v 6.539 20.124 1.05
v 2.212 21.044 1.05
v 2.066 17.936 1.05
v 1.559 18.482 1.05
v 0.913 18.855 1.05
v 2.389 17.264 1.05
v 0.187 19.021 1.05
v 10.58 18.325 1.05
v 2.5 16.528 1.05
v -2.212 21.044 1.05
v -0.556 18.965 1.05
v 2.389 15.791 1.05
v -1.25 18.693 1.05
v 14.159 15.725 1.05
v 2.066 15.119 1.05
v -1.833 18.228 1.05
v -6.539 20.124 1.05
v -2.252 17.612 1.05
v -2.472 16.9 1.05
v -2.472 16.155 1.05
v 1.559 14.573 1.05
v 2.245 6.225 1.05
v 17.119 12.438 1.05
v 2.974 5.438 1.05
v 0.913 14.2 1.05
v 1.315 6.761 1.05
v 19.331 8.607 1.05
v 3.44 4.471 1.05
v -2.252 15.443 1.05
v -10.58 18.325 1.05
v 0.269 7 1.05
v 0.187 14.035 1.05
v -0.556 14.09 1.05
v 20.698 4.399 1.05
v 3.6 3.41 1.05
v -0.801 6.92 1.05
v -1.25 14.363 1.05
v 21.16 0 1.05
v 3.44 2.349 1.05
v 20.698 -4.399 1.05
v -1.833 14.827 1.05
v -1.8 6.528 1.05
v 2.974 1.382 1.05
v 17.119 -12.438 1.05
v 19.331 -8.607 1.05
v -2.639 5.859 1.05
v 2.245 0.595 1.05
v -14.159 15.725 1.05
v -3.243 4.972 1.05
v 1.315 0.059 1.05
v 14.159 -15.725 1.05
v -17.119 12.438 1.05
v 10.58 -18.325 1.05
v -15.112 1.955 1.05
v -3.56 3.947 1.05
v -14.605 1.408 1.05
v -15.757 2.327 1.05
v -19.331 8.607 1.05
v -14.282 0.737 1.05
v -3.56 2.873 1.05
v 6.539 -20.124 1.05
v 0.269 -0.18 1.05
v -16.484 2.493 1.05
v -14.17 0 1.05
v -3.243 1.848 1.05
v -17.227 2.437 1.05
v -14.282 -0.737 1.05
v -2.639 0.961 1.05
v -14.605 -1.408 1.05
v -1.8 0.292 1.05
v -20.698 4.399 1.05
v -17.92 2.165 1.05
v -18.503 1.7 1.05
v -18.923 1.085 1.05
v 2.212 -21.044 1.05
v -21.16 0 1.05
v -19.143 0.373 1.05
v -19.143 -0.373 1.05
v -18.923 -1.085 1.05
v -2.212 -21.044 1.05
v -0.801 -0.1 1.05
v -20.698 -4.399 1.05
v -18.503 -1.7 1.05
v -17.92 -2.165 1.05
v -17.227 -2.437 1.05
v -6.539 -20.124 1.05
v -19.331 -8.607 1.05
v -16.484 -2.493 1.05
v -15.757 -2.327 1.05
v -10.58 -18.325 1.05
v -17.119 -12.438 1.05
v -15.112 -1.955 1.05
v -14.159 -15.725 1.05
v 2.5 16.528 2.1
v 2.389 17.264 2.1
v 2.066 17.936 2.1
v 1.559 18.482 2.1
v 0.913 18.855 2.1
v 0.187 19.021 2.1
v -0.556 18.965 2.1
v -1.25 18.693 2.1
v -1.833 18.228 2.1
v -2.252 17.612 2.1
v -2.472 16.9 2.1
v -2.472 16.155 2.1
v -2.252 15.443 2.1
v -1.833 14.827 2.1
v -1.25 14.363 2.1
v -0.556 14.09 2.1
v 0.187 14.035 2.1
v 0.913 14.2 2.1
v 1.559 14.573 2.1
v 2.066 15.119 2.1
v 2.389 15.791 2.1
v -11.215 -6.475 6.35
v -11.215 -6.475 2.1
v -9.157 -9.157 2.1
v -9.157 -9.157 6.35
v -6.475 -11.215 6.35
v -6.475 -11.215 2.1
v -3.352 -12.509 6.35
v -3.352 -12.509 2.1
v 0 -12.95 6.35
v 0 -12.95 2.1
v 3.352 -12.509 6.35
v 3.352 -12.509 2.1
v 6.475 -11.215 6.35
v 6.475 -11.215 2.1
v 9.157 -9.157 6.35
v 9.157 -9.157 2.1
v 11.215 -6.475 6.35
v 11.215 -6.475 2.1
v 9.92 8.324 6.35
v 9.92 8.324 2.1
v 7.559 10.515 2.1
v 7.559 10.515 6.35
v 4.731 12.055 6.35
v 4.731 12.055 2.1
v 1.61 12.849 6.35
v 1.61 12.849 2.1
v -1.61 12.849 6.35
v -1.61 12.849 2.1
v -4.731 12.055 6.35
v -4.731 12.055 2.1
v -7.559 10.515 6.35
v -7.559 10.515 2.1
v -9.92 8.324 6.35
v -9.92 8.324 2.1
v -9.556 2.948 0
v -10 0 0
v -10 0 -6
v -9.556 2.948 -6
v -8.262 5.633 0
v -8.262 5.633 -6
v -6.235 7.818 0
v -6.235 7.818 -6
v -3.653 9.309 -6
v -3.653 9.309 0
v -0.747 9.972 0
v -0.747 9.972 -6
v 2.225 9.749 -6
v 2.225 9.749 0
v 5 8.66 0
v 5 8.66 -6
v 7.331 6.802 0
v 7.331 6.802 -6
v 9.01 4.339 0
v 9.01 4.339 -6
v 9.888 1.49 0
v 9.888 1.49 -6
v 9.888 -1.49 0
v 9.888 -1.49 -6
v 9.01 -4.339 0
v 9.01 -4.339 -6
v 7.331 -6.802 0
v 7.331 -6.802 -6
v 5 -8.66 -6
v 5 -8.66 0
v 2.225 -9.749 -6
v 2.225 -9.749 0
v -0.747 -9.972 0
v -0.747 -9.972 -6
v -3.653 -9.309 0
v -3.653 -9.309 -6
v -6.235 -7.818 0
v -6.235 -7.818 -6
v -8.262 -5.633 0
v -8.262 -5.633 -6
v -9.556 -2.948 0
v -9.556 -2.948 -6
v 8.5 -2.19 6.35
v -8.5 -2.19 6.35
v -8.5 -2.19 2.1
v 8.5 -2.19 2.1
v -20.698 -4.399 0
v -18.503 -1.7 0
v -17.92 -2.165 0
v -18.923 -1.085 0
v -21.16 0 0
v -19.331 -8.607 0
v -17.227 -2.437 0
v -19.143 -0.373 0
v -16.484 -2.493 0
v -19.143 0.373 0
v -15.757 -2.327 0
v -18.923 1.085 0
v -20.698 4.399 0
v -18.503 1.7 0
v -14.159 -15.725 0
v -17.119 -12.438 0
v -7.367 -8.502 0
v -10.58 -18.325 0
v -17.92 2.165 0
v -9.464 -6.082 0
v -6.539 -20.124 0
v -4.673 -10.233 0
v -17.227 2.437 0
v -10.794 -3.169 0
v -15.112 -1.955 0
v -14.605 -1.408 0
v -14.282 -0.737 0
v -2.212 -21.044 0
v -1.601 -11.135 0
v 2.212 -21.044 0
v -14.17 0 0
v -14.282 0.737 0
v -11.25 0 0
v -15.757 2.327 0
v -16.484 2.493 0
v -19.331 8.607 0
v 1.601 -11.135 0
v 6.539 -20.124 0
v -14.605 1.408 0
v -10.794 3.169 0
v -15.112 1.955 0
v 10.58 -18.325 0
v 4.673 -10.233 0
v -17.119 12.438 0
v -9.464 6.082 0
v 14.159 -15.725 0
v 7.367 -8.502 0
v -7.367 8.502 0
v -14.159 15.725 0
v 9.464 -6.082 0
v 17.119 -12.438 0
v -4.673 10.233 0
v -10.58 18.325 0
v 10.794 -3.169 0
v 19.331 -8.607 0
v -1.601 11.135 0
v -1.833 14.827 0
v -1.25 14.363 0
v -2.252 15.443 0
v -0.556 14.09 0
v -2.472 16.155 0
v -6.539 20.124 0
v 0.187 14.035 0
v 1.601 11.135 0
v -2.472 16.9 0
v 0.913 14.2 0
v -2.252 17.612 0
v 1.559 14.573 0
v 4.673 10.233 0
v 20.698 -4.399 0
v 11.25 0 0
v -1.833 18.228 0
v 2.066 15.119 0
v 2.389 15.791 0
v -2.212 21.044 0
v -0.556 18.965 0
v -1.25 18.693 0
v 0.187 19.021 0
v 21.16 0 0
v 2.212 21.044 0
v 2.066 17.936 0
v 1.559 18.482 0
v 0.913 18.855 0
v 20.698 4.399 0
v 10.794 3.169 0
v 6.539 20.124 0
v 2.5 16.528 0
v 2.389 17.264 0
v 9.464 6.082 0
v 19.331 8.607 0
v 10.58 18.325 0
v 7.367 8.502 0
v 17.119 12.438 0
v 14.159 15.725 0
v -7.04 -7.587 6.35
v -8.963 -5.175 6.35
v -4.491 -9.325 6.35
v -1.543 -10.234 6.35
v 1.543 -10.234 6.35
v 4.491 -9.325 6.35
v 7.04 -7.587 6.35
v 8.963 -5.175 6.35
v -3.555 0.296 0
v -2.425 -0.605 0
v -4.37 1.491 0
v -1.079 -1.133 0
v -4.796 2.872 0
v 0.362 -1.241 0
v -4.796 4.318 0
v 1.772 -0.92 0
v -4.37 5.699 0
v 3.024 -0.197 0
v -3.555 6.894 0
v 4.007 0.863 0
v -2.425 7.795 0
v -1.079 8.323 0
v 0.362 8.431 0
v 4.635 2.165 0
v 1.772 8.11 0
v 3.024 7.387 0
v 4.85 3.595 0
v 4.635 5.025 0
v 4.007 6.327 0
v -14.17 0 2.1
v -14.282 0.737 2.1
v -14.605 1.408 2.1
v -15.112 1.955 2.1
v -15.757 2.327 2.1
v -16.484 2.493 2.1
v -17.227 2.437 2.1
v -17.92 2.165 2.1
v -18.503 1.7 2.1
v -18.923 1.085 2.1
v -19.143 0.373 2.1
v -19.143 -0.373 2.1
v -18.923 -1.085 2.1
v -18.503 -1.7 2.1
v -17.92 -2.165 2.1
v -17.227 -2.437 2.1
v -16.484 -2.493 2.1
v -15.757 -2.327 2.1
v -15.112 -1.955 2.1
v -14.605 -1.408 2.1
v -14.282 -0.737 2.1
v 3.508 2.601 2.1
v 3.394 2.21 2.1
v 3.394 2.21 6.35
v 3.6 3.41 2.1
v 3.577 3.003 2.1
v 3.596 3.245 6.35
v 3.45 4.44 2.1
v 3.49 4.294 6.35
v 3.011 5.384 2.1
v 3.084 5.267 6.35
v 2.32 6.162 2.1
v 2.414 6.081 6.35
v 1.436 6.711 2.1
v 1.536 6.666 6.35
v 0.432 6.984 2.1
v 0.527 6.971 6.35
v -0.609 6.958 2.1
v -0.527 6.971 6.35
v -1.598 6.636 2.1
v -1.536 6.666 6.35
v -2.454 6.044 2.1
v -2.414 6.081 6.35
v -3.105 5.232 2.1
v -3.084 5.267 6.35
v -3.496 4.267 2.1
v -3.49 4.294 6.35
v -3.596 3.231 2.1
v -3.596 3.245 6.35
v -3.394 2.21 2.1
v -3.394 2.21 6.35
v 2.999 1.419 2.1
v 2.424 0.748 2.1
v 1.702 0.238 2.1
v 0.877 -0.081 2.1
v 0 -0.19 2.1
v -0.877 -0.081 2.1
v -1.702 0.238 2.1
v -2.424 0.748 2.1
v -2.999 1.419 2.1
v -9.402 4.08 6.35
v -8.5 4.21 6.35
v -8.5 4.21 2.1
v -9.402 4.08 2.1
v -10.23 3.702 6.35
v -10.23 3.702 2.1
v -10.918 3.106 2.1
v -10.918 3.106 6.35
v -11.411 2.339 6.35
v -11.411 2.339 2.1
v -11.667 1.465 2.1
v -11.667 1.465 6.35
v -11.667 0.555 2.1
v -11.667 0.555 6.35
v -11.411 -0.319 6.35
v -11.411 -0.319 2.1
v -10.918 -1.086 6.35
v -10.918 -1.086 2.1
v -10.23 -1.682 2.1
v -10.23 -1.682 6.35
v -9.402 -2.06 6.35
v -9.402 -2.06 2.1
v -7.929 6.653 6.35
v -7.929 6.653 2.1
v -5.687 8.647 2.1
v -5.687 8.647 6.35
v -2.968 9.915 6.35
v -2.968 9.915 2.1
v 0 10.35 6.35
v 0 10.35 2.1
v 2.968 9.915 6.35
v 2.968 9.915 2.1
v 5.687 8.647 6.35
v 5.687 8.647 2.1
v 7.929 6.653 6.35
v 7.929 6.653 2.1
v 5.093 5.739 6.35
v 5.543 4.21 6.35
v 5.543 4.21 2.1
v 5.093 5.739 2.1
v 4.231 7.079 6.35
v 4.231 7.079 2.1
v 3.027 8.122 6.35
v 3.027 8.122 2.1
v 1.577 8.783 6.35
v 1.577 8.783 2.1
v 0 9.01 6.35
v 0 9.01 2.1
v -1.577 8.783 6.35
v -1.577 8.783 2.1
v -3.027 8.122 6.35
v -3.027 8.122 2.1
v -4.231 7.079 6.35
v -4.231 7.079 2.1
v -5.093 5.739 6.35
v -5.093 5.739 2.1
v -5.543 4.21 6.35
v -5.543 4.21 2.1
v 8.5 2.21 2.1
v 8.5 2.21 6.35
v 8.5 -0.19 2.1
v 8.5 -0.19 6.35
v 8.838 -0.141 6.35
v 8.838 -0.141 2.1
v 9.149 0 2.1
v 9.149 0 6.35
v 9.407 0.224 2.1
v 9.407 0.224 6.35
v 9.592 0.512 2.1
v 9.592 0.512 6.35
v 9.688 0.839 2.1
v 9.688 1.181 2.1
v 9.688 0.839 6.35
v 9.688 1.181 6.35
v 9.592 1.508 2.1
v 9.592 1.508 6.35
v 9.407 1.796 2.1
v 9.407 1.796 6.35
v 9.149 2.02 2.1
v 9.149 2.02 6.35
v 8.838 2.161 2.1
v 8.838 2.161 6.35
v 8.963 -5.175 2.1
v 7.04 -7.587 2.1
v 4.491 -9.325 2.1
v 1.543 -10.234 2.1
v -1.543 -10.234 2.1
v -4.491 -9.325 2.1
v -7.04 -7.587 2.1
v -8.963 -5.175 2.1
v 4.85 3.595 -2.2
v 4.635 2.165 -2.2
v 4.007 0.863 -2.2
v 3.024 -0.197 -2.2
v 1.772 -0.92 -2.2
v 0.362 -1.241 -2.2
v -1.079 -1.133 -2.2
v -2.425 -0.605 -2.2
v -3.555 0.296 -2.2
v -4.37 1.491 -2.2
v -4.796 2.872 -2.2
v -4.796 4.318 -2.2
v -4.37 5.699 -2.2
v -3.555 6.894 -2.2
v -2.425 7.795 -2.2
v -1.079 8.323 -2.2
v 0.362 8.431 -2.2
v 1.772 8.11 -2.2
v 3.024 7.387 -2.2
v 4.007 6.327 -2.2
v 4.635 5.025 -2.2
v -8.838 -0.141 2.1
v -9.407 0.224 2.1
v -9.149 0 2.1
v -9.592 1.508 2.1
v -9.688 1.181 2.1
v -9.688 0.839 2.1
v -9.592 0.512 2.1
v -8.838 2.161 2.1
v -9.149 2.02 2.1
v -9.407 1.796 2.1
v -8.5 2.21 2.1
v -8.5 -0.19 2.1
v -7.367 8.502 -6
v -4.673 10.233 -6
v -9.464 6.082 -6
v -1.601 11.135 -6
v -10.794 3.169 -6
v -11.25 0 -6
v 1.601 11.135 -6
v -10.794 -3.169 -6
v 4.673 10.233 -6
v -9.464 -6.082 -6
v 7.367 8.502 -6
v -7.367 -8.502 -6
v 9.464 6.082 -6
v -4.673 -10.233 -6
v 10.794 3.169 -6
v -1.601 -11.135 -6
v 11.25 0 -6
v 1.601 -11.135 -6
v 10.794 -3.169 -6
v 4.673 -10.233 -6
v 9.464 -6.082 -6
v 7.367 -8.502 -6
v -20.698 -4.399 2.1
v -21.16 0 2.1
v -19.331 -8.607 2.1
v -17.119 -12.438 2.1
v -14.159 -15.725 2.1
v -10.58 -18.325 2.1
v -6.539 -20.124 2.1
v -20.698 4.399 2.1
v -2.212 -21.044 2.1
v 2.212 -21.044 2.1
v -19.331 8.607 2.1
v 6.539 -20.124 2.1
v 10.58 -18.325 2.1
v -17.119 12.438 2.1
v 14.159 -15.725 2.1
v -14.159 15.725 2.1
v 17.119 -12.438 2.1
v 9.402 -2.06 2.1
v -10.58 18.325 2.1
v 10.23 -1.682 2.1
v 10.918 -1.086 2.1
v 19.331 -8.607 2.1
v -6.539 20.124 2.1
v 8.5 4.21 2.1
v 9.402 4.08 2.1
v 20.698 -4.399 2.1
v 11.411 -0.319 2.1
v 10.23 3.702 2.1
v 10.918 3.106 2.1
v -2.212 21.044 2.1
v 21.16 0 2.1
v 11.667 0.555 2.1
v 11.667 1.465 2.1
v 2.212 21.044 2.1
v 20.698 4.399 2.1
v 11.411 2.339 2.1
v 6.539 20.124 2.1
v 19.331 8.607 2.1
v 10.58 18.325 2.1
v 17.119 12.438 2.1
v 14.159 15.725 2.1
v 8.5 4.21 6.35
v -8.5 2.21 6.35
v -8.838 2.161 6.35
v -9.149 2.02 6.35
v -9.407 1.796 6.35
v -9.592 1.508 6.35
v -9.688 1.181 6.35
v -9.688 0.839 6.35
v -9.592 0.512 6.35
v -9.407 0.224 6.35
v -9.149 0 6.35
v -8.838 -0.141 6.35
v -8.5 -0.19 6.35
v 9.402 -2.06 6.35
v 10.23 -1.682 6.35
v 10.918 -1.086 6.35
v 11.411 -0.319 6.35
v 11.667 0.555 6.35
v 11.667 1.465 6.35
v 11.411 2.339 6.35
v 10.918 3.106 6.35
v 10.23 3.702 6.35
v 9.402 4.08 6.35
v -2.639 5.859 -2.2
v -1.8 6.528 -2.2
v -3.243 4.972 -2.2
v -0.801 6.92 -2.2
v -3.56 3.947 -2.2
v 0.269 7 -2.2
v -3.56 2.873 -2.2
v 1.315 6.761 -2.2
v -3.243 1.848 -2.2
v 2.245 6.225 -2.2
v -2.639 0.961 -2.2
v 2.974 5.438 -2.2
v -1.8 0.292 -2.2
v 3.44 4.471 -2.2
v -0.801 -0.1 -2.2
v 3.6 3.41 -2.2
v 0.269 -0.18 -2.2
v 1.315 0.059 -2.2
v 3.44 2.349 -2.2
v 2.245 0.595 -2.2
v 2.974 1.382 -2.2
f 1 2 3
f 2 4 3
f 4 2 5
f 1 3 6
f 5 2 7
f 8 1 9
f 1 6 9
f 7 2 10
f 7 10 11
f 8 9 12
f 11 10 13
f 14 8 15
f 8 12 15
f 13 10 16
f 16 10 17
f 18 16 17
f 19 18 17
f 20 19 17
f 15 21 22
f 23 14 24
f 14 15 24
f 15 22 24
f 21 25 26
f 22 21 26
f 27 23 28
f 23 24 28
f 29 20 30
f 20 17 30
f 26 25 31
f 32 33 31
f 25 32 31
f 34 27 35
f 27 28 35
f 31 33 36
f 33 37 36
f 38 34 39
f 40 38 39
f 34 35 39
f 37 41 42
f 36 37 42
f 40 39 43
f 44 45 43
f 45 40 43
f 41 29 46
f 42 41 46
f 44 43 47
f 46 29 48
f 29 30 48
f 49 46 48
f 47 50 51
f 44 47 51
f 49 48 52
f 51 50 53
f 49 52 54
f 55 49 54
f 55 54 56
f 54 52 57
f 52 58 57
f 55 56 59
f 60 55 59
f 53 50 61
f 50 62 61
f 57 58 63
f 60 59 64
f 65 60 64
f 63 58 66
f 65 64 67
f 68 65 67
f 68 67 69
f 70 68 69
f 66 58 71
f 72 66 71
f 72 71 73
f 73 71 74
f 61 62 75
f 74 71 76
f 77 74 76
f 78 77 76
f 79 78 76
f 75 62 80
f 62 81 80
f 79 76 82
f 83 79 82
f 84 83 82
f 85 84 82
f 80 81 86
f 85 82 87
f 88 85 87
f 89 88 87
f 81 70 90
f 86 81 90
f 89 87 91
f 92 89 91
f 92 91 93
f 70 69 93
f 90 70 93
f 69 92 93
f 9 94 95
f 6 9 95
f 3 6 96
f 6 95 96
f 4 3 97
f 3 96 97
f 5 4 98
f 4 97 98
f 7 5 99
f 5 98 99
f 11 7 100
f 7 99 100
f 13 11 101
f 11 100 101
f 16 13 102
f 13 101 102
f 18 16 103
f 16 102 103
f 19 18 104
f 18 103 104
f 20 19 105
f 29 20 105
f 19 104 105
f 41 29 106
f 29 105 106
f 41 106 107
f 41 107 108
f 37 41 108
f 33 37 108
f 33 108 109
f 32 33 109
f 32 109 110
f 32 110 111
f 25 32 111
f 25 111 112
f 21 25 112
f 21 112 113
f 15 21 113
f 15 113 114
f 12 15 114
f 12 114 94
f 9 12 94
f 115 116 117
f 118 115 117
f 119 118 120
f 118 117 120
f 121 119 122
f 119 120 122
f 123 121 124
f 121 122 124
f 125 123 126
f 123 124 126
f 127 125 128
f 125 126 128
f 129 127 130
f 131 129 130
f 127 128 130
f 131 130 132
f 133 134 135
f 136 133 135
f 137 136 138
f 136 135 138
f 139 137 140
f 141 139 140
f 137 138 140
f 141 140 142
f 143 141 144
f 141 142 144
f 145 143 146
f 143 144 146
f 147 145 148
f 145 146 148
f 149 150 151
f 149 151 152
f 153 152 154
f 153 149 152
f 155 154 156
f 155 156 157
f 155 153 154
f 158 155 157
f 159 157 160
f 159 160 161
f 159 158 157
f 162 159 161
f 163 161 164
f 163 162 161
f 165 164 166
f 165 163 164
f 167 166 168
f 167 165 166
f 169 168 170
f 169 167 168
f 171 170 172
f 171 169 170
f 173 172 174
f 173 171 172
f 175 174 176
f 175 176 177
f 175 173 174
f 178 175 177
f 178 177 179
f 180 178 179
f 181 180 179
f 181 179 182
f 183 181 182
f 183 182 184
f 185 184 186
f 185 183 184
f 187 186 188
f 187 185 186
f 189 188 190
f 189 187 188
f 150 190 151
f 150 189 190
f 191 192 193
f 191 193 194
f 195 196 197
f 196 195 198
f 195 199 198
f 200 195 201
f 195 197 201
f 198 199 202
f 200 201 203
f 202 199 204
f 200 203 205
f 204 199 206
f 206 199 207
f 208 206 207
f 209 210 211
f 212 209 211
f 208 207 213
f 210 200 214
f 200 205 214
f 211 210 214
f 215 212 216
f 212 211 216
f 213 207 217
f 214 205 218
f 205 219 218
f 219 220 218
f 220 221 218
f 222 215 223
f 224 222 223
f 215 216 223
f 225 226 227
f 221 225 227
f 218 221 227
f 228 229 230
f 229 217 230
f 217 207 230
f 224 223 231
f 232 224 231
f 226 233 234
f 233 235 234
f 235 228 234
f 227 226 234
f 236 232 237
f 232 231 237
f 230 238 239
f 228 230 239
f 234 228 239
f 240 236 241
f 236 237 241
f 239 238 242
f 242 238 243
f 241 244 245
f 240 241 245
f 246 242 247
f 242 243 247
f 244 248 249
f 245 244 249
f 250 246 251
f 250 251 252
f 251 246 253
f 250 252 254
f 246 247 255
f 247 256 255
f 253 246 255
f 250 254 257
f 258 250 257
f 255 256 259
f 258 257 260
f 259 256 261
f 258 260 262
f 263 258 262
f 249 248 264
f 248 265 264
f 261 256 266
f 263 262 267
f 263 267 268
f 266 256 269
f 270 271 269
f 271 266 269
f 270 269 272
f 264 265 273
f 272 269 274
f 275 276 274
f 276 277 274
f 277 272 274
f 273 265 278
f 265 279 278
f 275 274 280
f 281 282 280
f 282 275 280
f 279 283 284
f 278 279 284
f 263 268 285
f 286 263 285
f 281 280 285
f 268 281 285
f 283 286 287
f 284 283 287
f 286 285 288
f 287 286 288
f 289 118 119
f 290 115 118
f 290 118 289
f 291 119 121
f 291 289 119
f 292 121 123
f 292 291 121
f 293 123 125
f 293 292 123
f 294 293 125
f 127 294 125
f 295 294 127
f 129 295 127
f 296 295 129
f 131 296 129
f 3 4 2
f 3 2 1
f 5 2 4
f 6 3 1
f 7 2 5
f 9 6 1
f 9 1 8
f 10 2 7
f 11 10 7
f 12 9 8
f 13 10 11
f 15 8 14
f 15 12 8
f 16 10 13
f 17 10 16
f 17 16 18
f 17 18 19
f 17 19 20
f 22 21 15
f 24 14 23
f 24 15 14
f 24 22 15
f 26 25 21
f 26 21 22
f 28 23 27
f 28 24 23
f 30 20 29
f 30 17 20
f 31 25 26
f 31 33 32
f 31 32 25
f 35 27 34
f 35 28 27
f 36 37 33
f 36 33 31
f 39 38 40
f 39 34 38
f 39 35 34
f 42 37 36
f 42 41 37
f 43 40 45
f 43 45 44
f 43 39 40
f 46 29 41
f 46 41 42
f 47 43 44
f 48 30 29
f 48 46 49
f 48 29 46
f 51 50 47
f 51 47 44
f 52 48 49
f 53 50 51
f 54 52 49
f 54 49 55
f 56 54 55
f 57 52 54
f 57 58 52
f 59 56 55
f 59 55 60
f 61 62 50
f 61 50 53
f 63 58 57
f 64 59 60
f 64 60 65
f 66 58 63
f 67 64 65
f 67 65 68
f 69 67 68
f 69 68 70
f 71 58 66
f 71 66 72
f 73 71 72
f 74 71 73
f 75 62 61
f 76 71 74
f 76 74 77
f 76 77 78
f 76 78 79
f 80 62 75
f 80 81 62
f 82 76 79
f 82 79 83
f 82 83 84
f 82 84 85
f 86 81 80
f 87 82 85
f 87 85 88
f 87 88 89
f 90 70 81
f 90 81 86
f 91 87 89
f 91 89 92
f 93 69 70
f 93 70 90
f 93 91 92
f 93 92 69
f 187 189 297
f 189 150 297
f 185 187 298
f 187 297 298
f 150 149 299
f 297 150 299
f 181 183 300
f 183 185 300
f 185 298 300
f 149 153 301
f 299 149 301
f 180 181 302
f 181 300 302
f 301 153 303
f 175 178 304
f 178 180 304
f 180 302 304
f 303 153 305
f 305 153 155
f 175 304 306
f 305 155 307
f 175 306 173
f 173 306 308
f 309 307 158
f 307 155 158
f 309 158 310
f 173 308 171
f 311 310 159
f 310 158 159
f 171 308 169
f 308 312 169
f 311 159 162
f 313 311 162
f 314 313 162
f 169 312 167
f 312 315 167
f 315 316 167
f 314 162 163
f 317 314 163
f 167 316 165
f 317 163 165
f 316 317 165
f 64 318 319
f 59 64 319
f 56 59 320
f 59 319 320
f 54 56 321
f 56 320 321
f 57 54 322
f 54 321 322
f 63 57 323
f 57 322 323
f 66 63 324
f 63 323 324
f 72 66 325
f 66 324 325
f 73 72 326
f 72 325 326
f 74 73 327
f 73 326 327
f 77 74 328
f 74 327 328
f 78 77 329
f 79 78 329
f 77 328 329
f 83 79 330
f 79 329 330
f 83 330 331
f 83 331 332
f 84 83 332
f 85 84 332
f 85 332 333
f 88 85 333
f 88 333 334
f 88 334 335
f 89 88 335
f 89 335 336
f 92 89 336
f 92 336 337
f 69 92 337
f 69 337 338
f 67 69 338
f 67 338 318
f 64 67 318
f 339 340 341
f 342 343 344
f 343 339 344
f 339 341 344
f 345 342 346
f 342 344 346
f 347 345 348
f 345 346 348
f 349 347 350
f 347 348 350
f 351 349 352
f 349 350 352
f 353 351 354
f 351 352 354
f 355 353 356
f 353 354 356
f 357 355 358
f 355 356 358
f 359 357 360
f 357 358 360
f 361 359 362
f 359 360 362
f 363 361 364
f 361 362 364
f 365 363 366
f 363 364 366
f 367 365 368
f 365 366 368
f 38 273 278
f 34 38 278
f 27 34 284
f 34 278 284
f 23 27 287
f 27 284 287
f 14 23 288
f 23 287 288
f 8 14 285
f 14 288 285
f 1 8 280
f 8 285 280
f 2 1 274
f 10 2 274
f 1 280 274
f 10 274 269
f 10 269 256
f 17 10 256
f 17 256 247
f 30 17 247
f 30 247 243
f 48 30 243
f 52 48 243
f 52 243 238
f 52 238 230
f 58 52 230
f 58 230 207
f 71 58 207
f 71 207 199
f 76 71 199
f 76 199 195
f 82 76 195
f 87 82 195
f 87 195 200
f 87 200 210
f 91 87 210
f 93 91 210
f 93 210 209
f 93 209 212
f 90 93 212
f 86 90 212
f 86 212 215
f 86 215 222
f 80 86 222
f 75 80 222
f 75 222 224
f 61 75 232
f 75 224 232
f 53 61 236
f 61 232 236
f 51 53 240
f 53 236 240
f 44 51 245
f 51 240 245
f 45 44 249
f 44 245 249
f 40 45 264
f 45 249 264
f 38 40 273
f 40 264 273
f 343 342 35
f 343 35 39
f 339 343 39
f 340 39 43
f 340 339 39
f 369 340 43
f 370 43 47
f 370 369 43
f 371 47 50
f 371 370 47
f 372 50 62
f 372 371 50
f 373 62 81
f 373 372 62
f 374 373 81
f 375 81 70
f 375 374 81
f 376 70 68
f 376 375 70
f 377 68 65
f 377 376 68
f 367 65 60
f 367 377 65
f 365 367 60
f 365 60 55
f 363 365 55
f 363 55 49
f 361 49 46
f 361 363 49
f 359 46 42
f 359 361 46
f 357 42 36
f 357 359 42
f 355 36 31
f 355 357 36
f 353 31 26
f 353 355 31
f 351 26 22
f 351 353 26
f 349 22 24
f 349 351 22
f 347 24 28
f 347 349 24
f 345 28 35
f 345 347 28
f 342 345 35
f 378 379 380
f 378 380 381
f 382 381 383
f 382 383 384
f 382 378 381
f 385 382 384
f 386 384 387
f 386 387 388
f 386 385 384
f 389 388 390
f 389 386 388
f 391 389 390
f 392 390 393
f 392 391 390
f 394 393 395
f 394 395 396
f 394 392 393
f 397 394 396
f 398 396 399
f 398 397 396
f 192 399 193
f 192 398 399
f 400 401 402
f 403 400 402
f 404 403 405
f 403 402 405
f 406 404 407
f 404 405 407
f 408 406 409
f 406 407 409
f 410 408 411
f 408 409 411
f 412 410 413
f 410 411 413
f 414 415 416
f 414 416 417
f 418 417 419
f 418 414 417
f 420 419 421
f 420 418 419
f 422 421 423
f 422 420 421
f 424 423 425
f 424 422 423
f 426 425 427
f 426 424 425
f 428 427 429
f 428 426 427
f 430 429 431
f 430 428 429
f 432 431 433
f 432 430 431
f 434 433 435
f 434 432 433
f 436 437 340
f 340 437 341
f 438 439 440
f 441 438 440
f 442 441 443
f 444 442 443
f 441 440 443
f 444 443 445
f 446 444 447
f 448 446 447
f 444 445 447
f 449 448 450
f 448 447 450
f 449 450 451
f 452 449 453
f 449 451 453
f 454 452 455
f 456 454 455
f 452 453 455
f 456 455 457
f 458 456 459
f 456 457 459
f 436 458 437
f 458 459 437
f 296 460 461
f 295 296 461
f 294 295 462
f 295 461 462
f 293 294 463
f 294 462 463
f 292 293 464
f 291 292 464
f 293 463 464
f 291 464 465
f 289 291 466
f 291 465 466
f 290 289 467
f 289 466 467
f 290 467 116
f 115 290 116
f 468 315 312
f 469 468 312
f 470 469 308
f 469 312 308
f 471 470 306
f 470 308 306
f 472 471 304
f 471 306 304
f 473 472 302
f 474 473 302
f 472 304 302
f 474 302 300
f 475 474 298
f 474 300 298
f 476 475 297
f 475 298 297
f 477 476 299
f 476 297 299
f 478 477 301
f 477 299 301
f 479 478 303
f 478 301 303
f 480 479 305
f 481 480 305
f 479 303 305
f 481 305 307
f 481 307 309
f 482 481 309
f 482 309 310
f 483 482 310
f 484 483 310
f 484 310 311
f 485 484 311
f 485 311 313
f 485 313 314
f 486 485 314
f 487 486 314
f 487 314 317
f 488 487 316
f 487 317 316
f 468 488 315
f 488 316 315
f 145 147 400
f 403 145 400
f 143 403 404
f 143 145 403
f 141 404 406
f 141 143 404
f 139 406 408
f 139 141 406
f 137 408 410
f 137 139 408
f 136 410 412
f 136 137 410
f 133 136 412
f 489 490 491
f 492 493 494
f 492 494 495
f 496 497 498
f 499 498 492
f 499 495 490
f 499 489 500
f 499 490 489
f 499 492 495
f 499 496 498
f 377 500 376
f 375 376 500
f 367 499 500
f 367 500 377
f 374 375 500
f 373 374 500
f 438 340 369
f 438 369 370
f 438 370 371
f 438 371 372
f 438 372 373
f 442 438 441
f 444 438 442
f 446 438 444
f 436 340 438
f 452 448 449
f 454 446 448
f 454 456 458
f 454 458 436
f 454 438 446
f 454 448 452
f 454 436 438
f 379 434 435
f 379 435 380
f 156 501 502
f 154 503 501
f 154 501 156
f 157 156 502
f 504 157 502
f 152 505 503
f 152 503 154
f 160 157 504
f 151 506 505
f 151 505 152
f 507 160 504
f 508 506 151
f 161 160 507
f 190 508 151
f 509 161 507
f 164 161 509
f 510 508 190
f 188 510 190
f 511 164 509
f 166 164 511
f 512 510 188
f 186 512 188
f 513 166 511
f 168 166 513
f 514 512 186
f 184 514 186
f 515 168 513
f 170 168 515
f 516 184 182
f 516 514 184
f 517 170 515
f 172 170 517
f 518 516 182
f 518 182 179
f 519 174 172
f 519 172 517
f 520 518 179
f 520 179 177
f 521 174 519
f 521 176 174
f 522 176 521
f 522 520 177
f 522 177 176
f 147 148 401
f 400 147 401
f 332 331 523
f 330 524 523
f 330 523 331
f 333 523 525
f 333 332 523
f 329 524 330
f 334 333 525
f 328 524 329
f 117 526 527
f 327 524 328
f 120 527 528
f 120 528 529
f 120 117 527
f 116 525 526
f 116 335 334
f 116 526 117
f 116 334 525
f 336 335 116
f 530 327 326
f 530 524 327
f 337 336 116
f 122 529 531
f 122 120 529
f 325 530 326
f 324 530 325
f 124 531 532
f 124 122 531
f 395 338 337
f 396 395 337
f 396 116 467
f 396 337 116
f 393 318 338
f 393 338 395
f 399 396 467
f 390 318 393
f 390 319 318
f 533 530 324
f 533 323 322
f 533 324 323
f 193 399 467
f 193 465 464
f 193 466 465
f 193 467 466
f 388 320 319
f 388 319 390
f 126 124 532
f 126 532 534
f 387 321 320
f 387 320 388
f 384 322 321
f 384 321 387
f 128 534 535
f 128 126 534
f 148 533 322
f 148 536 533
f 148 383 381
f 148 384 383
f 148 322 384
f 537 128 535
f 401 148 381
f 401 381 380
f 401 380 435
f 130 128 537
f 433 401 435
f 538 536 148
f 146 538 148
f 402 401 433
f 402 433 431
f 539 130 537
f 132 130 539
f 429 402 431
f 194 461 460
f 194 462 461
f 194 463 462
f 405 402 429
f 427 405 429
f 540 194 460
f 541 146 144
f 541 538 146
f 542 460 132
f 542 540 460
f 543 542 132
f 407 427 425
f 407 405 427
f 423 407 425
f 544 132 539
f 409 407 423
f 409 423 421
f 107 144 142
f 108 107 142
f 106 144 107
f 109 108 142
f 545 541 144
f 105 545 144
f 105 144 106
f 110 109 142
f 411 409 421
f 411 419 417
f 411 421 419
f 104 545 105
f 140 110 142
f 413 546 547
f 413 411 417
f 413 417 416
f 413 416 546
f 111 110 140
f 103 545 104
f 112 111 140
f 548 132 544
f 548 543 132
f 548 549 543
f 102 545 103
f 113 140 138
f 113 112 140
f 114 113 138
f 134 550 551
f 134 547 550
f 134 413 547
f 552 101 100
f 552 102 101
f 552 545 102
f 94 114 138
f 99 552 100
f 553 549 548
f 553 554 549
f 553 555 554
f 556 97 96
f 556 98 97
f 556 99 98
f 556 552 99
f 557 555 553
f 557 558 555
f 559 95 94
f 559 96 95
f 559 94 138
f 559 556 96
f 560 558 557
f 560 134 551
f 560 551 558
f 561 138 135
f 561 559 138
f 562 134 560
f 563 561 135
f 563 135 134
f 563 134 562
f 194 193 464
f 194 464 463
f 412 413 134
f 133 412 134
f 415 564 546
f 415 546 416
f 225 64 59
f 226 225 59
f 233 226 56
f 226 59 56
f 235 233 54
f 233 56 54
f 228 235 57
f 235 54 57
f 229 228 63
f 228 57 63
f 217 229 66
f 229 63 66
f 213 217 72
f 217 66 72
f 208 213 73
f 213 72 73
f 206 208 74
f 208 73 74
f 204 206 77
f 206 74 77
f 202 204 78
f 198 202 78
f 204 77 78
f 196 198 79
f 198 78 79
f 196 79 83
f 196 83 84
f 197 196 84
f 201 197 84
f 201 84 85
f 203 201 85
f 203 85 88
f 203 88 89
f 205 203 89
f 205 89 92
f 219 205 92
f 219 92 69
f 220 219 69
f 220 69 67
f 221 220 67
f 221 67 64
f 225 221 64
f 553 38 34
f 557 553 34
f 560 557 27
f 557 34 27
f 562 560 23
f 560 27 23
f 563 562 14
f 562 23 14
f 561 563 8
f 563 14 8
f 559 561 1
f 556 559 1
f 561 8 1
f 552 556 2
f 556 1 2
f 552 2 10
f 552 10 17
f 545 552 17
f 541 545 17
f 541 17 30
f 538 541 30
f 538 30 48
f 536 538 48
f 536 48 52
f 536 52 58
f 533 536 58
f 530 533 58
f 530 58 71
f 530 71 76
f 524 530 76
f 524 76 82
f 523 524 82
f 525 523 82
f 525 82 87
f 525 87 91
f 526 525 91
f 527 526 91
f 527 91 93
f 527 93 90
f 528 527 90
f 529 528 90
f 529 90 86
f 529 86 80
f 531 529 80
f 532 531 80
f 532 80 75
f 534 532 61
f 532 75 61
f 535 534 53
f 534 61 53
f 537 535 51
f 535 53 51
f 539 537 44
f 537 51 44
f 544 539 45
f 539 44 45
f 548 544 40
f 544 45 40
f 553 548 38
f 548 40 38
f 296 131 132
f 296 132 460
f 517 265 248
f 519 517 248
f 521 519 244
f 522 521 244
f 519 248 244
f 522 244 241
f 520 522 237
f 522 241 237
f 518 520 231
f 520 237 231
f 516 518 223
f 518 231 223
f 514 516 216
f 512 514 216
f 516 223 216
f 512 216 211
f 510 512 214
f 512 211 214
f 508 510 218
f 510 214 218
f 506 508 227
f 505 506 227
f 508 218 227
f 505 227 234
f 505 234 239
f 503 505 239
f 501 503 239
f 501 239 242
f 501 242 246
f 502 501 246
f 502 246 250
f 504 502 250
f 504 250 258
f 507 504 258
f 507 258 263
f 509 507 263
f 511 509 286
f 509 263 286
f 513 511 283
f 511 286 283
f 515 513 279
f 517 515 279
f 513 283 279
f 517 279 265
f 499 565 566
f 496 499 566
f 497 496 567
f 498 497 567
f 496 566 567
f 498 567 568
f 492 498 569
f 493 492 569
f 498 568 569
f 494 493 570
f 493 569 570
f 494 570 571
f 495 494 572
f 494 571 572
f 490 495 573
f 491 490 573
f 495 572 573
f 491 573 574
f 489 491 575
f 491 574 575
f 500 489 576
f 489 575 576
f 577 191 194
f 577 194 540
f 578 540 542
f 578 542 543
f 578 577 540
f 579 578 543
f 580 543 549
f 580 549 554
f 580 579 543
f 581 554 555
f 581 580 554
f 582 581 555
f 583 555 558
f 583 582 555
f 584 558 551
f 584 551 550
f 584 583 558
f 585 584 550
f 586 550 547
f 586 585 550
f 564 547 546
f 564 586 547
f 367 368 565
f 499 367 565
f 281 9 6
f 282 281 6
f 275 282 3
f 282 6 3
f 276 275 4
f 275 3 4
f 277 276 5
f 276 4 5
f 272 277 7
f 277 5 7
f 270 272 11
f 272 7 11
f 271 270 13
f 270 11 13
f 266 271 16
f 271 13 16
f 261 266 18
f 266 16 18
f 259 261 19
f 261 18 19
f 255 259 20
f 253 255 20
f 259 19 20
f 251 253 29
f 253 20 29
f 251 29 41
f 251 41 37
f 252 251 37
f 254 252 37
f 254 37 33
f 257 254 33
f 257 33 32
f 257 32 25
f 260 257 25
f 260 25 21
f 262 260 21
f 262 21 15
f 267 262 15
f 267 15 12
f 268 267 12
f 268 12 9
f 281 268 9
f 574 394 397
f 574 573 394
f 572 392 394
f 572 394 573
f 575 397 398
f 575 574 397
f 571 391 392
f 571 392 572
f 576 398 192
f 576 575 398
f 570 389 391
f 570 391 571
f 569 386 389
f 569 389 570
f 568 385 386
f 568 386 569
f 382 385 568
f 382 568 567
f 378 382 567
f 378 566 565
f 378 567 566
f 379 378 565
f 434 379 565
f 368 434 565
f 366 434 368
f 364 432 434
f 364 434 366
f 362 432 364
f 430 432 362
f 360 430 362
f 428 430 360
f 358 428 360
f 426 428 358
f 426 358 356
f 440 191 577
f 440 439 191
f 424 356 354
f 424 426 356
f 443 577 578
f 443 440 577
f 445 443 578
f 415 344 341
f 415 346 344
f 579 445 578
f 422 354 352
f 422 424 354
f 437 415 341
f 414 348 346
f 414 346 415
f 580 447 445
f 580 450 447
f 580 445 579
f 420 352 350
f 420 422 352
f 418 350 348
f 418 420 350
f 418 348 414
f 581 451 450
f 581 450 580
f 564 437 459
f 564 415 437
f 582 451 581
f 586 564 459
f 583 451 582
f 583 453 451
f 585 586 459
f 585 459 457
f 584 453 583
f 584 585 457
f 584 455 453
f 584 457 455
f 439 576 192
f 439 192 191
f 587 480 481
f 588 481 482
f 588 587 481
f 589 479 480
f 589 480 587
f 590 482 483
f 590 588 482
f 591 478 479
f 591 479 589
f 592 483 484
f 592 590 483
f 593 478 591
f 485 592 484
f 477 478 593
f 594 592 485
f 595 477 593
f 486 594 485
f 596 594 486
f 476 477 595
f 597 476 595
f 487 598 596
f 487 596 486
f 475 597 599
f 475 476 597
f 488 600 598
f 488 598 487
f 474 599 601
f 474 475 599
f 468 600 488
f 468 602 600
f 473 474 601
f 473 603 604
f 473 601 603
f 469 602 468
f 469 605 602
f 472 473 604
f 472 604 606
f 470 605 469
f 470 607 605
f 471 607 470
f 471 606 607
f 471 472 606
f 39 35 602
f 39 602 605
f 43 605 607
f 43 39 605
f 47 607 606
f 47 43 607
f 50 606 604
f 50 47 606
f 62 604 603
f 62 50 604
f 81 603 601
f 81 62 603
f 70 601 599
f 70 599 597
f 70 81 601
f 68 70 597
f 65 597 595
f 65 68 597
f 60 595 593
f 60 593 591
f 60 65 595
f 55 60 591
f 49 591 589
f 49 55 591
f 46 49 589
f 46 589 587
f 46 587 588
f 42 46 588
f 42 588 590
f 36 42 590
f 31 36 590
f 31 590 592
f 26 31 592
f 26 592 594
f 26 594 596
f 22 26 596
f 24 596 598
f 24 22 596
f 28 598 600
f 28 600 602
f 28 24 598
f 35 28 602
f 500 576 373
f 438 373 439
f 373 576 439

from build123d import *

# Parameters (mm, degrees)
SKETCH1_R               = 21.16
BOSS_EXTRUDE2_DEPTH     = 2.1
CUT_EXTRUDE1_DEPTH      = 30.998353288
CUT_EXTRUDE1_DEPTH_BACK = 30.998353288
SKETCH3_R               = 3.6
SKETCH6_R               = 4.85
SKETCH6_R_2             = 3.6
BOSS_EXTRUDE5_DEPTH     = 2.2
SKETCH7_R               = 11.25
SKETCH7_R_2             = 10
BOSS_EXTRUDE6_DEPTH     = 6
SPLIT1_SURFACE_1_BACK   = 61.395
SPLIT1_SURFACE_1_DEPTH  = 122.79
SPLIT1_SURFACE_2_BACK   = 61.395
SPLIT1_SURFACE_2_DEPTH  = 122.79
BOSS_EXTRUDE7_START     = 4.25
BOSS_EXTRUDE7_DEPTH     = 4.25
BOSS_EXTRUDE4_DEPTH     = 4.25
SKETCH10_R              = 2.5
CUT_EXTRUDE2_DEPTH      = 32.001632215


with BuildPart() as part:
    # Sketch1 → Boss-Extrude2 (new body)
    with BuildSketch(Plane.XY):
        Circle(SKETCH1_R)
    extrude(amount=BOSS_EXTRUDE2_DEPTH)

    # Sketch3 → Cut-Extrude1 (cut, two sides: drawn at the far end of the back side and taken through both)
    with BuildSketch(Plane.XY.offset(2.1).offset(-CUT_EXTRUDE1_DEPTH_BACK)):
        with Locations((0, 3.41)):
            Circle(SKETCH3_R)
    extrude(amount=CUT_EXTRUDE1_DEPTH + CUT_EXTRUDE1_DEPTH_BACK, mode=Mode.SUBTRACT)

    # Sketch6 → Boss-Extrude5 (add)
    with BuildSketch(Plane(origin=(0, 0, 0), x_dir=(-1, 0, 0), z_dir=(0, 0, -1))):
        with Locations(Location((0, 3.595, 0), (0, 0, 180))):
            Circle(SKETCH6_R)
        with Locations(Location((0, 3.41, 0), (0, 0, 180))):
            Circle(SKETCH6_R_2, mode=Mode.SUBTRACT)
    extrude(amount=BOSS_EXTRUDE5_DEPTH)

    # Sketch7 → Boss-Extrude6 (add)
    with BuildSketch(Plane(origin=(0, 0, 0), x_dir=(-1, 0, 0), z_dir=(0, 0, -1))):
        with Locations(Location((0, 0, 0), (0, 0, 180))):
            Circle(SKETCH7_R)
        Circle(SKETCH7_R_2, mode=Mode.SUBTRACT)
    extrude(amount=BOSS_EXTRUDE6_DEPTH)


with BuildPart() as body_2:
    # Split1: the piece behind the surface
    add(part.part)
    # Split1 surface: a surface, the sketch's curves swept straight by 122.79 mm
    with BuildLine(Plane(origin=(0, 0, 0), x_dir=(0, 0, -1), z_dir=(1, 0, 0)).offset(-SPLIT1_SURFACE_1_BACK), mode=Mode.PRIVATE) as split1_surface_1_path:
        Line((-1.05, 21.16), (-1.05, -21.16))
    split1_surface_1 = Shell.extrude(split1_surface_1_path.wire(), (1 * SPLIT1_SURFACE_1_DEPTH, 0 * SPLIT1_SURFACE_1_DEPTH, 0 * SPLIT1_SURFACE_1_DEPTH))
    split(bisect_by=split1_surface_1, keep=Keep.BOTTOM)

    # Sketch9 → Boss-Extrude7 (add)
    with BuildSketch(Plane.XY.offset(2.1).offset(BOSS_EXTRUDE7_START)):
        with BuildLine():
            Line((-8.5, -2.19), (8.5, -2.19))
            ThreePointArc((8.5, -2.19), (11.7, 1.01), (8.5, 4.21))
            Line((8.5, 4.21), (5.542562584, 4.21))
            ThreePointArc((5.542562584, 4.21), (0, 9.01), (-5.542562584, 4.21))
            Line((-5.542562584, 4.21), (-8.5, 4.21))
            ThreePointArc((-8.5, 4.21), (-11.7, 1.01), (-8.5, -2.19))
        make_face()
        with BuildLine():
            Line((-8.5, -0.19), (8.5, -0.19))
            ThreePointArc((8.5, -0.19), (9.7, 1.01), (8.5, 2.21))
            Line((8.5, 2.21), (3.39411255, 2.21))
            ThreePointArc((3.39411255, 2.21), (0, 7.01), (-3.39411255, 2.21))
            Line((-3.39411255, 2.21), (-8.5, 2.21))
            ThreePointArc((-8.5, 2.21), (-9.7, 1.01), (-8.5, -0.19))
        make_face(mode=Mode.SUBTRACT)
    extrude(amount=-BOSS_EXTRUDE7_DEPTH)

    # Sketch5 → Boss-Extrude4 (add)
    with BuildSketch(Plane.XY.offset(2.1)):
        with BuildLine():
            Line((7.928559986, 6.65285176), (9.920275538, 8.324099545))
            ThreePointArc((9.920275538, 8.324099545), (0, 12.95), (-9.920275538, 8.324099545))
            Line((-9.920275538, 8.324099545), (-7.928559986, 6.65285176))
            ThreePointArc((-7.928559986, 6.65285176), (0, 10.35), (7.928559986, 6.65285176))
        make_face()
        with BuildLine():
            Line((-8.963362929, -5.175), (-11.215028979, -6.475))
            ThreePointArc((-11.215028979, -6.475), (0, -12.95), (11.215028979, -6.475))
            Line((11.215028979, -6.475), (8.963362929, -5.175))
            ThreePointArc((8.963362929, -5.175), (0, -10.35), (-8.963362929, -5.175))
        make_face()
    extrude(amount=BOSS_EXTRUDE4_DEPTH)


with BuildPart() as part_1:
    add(part.part)

    # Split1: split by a surface, the side it looks to stays
    # Split1 surface: a surface, the sketch's curves swept straight by 122.79 mm
    with BuildLine(Plane(origin=(0, 0, 0), x_dir=(0, 0, -1), z_dir=(1, 0, 0)).offset(-SPLIT1_SURFACE_2_BACK), mode=Mode.PRIVATE) as split1_surface_2_path:
        Line((-1.05, 21.16), (-1.05, -21.16))
    split1_surface_2 = Shell.extrude(split1_surface_2_path.wire(), (1 * SPLIT1_SURFACE_2_DEPTH, 0 * SPLIT1_SURFACE_2_DEPTH, 0 * SPLIT1_SURFACE_2_DEPTH))
    split(bisect_by=split1_surface_2, keep=Keep.TOP)


with BuildPart() as cut_extrude2_tool:
    # Sketch10 → Cut-Extrude2 (new, through all)
    with BuildSketch(Plane.XY.offset(2.1)):
        with Locations((0, 16.527610664)):
            Circle(SKETCH10_R)
        with Locations((-16.670494114, 0)):
            Circle(SKETCH10_R)
    extrude(amount=-CUT_EXTRUDE2_DEPTH)


with BuildPart() as part_2:
    add(part_1.part)

    # Cut-Extrude2: cut by cut_extrude2_tool
    add(cut_extrude2_tool.part, mode=Mode.SUBTRACT)


with BuildPart() as body_2_1:
    add(body_2.part)

    # Cut-Extrude2: cut by cut_extrude2_tool
    add(cut_extrude2_tool.part, mode=Mode.SUBTRACT)


solid = Compound([part_2.part, body_2_1.part])
